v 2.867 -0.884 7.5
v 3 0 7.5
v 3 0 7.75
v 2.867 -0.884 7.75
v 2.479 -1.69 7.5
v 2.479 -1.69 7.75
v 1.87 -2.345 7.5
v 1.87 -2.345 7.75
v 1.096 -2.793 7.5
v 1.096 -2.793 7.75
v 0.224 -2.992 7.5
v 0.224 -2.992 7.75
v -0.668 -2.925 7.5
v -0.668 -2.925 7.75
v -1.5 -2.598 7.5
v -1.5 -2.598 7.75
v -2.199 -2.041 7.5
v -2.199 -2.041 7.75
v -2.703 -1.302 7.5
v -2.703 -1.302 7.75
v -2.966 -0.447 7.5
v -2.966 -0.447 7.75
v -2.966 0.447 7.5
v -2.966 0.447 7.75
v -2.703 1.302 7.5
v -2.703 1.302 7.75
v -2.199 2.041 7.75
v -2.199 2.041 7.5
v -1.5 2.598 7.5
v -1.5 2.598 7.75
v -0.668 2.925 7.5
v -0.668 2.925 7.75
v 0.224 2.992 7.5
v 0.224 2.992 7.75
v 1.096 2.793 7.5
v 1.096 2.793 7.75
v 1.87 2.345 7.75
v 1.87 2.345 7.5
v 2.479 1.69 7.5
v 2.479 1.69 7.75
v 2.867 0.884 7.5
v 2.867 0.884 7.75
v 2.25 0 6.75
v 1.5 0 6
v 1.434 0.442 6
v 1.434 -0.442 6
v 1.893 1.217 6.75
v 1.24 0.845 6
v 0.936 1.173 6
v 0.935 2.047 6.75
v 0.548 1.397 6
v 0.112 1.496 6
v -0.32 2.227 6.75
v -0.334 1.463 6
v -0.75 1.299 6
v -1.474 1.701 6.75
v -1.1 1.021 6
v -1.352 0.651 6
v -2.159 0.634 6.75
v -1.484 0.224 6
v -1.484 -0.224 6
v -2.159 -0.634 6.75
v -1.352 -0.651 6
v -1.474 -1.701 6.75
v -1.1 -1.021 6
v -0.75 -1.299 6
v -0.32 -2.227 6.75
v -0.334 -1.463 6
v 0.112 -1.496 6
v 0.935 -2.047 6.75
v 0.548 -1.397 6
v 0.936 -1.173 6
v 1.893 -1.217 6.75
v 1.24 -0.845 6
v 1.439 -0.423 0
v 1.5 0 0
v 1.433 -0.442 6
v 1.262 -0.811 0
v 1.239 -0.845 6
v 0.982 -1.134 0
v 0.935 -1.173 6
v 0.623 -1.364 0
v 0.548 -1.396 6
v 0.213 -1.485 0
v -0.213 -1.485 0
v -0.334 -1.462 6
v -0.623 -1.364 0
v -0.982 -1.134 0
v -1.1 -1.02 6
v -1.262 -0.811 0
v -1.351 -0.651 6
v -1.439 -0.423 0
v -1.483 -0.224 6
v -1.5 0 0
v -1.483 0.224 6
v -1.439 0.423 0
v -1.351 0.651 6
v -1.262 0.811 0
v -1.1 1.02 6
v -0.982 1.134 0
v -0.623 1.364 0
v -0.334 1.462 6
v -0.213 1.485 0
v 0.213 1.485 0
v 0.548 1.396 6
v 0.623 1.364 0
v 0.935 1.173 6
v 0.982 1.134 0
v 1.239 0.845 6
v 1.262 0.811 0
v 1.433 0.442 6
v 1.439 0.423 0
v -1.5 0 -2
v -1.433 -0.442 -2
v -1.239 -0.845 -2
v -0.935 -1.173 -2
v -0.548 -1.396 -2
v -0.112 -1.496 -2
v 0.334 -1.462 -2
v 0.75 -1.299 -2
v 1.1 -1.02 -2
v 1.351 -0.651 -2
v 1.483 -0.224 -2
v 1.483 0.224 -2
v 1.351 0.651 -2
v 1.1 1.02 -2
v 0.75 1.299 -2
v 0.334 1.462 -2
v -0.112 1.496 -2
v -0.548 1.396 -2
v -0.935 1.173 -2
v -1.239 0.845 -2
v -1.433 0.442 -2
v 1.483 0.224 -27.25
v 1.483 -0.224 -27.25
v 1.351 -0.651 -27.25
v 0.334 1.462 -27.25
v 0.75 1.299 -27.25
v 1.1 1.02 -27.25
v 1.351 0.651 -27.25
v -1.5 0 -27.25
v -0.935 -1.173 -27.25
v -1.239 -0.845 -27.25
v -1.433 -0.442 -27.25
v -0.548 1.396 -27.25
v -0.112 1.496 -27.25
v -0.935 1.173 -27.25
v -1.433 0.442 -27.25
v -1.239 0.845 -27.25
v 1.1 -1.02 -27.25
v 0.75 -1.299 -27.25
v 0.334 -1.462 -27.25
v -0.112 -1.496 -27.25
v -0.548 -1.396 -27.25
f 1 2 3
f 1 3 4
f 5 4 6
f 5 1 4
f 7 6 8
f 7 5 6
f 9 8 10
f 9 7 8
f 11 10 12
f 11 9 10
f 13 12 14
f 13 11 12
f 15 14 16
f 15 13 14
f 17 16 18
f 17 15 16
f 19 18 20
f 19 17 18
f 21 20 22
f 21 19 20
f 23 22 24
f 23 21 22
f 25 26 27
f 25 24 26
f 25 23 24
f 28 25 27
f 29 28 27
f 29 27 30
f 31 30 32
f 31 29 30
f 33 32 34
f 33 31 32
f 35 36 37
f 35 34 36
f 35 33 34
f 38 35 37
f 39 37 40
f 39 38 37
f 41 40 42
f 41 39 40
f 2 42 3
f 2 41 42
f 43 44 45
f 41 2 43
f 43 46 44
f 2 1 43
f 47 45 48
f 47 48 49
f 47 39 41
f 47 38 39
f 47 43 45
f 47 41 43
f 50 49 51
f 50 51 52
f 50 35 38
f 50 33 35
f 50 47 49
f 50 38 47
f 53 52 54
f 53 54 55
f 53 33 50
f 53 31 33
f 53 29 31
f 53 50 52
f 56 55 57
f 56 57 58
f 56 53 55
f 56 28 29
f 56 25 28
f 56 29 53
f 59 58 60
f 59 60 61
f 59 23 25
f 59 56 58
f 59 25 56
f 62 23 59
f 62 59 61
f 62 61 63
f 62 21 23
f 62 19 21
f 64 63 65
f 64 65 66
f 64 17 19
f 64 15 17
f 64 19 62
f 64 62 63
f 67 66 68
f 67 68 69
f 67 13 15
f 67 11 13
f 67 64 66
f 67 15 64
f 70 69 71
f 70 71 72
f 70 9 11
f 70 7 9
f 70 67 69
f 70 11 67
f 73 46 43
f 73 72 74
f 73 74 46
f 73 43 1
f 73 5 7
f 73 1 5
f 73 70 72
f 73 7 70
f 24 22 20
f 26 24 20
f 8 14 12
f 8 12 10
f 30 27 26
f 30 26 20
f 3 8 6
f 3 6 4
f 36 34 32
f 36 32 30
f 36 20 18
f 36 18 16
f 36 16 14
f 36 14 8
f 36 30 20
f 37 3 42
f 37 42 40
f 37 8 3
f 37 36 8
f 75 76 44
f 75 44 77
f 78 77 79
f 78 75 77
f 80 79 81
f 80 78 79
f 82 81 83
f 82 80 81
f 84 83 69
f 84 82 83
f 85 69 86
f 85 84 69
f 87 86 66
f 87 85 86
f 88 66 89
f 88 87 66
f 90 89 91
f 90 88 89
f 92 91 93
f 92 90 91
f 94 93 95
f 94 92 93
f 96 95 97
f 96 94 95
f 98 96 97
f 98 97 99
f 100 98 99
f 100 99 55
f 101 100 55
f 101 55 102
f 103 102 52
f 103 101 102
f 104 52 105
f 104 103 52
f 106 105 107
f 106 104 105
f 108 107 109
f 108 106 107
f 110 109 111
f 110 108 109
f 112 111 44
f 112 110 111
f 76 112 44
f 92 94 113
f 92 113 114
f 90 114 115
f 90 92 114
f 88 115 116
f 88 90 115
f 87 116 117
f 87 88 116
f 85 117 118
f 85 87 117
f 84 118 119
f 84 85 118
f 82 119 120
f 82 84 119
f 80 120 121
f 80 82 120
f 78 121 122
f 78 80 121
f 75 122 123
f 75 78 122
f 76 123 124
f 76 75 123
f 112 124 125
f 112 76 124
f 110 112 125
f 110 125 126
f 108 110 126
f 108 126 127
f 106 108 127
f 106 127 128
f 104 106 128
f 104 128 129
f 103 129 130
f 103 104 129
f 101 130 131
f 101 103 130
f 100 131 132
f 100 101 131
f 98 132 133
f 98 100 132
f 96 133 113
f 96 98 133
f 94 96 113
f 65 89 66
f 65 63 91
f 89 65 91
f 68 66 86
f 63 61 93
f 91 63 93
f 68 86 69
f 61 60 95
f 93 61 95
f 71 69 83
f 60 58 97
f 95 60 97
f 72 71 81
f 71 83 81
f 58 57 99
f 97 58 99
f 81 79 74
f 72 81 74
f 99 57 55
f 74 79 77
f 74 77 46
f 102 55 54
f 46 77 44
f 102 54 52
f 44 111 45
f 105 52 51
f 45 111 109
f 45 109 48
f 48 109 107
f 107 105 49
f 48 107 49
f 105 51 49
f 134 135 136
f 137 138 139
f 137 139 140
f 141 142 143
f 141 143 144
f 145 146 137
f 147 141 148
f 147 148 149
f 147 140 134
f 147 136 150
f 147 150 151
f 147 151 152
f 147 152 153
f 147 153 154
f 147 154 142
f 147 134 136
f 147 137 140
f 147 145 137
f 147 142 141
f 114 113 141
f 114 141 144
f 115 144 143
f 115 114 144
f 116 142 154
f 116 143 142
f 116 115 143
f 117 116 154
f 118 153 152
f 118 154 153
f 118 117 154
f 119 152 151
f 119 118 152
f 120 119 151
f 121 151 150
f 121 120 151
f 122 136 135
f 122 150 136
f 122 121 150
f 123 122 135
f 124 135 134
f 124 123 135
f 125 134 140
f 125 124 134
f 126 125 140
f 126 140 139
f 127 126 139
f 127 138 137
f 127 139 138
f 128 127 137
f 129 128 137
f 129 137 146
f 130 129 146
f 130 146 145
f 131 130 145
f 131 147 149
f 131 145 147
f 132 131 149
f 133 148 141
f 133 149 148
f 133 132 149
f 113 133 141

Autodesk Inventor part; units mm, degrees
ref_plane "YZ Plane" through (0, 0, 0) normal (1, 0, 0) x (0, 1, 0)
ref_plane "XZ Plane" through (0, 0, 0) normal (0, 1, 0) x (-1, 0, 0)
ref_plane "XY Plane" through (0, 0, 0) normal (0, 0, 1) x (1, 0, 0)
sketch "スケッチ1" plane through (0, 0, 0) normal (0, 0, 1) x (1, 0, 0)
  circle A0 centre (0, 0) radius 1.5
  dimension "d0" = 3
extrude "押し出し1" add sketch "スケッチ1" along normal blind 6
sketch "スケッチ2" plane through (0, 0, 6) normal (0, 0, 1) x (1, 0, 0)
  circle A0 centre (0, 0) radius 1.5 projected
  circle A1 centre (0, 0) radius 3
  dimension "d3" = 6
extrude "押し出し2" add sketch "スケッチ2" along normal blind 1.75 contours A0 | A1
thread "ねじ1" size "M3x0.5" class "6g" standard "ANSI Metric M Profile" full length
chamfer "面取り1" distance 1.5 angle 45 1 edges at (-3, 0, 6)
sketch "スケッチ4" plane through (0, 0, 0) normal (0, 0, -1) x (-1, 0, 0)
  circle A0 centre (0, 0) radius 1.5 projected
extrude "押し出し4" add sketch "スケッチ4" along normal blind 4
sketch "スケッチ5" plane through (0, 0, -4) normal (0, 0, -1) x (-1, 0, 0)
  circle A0 centre (0, 0) radius 1.5 projected
extrude "押し出し5" cut sketch "スケッチ5" against normal blind 2
sketch "スケッチ6" plane through (0, 0, -2) normal (0, 0, -1) x (-1, 0, 0)
  circle A0 centre (0, 0) radius 1.5 projected
extrude "押し出し6" add sketch "スケッチ6" along normal blind 25.25
properties part number "SB　35mm皿ネジ" material "Steel, Mild"
